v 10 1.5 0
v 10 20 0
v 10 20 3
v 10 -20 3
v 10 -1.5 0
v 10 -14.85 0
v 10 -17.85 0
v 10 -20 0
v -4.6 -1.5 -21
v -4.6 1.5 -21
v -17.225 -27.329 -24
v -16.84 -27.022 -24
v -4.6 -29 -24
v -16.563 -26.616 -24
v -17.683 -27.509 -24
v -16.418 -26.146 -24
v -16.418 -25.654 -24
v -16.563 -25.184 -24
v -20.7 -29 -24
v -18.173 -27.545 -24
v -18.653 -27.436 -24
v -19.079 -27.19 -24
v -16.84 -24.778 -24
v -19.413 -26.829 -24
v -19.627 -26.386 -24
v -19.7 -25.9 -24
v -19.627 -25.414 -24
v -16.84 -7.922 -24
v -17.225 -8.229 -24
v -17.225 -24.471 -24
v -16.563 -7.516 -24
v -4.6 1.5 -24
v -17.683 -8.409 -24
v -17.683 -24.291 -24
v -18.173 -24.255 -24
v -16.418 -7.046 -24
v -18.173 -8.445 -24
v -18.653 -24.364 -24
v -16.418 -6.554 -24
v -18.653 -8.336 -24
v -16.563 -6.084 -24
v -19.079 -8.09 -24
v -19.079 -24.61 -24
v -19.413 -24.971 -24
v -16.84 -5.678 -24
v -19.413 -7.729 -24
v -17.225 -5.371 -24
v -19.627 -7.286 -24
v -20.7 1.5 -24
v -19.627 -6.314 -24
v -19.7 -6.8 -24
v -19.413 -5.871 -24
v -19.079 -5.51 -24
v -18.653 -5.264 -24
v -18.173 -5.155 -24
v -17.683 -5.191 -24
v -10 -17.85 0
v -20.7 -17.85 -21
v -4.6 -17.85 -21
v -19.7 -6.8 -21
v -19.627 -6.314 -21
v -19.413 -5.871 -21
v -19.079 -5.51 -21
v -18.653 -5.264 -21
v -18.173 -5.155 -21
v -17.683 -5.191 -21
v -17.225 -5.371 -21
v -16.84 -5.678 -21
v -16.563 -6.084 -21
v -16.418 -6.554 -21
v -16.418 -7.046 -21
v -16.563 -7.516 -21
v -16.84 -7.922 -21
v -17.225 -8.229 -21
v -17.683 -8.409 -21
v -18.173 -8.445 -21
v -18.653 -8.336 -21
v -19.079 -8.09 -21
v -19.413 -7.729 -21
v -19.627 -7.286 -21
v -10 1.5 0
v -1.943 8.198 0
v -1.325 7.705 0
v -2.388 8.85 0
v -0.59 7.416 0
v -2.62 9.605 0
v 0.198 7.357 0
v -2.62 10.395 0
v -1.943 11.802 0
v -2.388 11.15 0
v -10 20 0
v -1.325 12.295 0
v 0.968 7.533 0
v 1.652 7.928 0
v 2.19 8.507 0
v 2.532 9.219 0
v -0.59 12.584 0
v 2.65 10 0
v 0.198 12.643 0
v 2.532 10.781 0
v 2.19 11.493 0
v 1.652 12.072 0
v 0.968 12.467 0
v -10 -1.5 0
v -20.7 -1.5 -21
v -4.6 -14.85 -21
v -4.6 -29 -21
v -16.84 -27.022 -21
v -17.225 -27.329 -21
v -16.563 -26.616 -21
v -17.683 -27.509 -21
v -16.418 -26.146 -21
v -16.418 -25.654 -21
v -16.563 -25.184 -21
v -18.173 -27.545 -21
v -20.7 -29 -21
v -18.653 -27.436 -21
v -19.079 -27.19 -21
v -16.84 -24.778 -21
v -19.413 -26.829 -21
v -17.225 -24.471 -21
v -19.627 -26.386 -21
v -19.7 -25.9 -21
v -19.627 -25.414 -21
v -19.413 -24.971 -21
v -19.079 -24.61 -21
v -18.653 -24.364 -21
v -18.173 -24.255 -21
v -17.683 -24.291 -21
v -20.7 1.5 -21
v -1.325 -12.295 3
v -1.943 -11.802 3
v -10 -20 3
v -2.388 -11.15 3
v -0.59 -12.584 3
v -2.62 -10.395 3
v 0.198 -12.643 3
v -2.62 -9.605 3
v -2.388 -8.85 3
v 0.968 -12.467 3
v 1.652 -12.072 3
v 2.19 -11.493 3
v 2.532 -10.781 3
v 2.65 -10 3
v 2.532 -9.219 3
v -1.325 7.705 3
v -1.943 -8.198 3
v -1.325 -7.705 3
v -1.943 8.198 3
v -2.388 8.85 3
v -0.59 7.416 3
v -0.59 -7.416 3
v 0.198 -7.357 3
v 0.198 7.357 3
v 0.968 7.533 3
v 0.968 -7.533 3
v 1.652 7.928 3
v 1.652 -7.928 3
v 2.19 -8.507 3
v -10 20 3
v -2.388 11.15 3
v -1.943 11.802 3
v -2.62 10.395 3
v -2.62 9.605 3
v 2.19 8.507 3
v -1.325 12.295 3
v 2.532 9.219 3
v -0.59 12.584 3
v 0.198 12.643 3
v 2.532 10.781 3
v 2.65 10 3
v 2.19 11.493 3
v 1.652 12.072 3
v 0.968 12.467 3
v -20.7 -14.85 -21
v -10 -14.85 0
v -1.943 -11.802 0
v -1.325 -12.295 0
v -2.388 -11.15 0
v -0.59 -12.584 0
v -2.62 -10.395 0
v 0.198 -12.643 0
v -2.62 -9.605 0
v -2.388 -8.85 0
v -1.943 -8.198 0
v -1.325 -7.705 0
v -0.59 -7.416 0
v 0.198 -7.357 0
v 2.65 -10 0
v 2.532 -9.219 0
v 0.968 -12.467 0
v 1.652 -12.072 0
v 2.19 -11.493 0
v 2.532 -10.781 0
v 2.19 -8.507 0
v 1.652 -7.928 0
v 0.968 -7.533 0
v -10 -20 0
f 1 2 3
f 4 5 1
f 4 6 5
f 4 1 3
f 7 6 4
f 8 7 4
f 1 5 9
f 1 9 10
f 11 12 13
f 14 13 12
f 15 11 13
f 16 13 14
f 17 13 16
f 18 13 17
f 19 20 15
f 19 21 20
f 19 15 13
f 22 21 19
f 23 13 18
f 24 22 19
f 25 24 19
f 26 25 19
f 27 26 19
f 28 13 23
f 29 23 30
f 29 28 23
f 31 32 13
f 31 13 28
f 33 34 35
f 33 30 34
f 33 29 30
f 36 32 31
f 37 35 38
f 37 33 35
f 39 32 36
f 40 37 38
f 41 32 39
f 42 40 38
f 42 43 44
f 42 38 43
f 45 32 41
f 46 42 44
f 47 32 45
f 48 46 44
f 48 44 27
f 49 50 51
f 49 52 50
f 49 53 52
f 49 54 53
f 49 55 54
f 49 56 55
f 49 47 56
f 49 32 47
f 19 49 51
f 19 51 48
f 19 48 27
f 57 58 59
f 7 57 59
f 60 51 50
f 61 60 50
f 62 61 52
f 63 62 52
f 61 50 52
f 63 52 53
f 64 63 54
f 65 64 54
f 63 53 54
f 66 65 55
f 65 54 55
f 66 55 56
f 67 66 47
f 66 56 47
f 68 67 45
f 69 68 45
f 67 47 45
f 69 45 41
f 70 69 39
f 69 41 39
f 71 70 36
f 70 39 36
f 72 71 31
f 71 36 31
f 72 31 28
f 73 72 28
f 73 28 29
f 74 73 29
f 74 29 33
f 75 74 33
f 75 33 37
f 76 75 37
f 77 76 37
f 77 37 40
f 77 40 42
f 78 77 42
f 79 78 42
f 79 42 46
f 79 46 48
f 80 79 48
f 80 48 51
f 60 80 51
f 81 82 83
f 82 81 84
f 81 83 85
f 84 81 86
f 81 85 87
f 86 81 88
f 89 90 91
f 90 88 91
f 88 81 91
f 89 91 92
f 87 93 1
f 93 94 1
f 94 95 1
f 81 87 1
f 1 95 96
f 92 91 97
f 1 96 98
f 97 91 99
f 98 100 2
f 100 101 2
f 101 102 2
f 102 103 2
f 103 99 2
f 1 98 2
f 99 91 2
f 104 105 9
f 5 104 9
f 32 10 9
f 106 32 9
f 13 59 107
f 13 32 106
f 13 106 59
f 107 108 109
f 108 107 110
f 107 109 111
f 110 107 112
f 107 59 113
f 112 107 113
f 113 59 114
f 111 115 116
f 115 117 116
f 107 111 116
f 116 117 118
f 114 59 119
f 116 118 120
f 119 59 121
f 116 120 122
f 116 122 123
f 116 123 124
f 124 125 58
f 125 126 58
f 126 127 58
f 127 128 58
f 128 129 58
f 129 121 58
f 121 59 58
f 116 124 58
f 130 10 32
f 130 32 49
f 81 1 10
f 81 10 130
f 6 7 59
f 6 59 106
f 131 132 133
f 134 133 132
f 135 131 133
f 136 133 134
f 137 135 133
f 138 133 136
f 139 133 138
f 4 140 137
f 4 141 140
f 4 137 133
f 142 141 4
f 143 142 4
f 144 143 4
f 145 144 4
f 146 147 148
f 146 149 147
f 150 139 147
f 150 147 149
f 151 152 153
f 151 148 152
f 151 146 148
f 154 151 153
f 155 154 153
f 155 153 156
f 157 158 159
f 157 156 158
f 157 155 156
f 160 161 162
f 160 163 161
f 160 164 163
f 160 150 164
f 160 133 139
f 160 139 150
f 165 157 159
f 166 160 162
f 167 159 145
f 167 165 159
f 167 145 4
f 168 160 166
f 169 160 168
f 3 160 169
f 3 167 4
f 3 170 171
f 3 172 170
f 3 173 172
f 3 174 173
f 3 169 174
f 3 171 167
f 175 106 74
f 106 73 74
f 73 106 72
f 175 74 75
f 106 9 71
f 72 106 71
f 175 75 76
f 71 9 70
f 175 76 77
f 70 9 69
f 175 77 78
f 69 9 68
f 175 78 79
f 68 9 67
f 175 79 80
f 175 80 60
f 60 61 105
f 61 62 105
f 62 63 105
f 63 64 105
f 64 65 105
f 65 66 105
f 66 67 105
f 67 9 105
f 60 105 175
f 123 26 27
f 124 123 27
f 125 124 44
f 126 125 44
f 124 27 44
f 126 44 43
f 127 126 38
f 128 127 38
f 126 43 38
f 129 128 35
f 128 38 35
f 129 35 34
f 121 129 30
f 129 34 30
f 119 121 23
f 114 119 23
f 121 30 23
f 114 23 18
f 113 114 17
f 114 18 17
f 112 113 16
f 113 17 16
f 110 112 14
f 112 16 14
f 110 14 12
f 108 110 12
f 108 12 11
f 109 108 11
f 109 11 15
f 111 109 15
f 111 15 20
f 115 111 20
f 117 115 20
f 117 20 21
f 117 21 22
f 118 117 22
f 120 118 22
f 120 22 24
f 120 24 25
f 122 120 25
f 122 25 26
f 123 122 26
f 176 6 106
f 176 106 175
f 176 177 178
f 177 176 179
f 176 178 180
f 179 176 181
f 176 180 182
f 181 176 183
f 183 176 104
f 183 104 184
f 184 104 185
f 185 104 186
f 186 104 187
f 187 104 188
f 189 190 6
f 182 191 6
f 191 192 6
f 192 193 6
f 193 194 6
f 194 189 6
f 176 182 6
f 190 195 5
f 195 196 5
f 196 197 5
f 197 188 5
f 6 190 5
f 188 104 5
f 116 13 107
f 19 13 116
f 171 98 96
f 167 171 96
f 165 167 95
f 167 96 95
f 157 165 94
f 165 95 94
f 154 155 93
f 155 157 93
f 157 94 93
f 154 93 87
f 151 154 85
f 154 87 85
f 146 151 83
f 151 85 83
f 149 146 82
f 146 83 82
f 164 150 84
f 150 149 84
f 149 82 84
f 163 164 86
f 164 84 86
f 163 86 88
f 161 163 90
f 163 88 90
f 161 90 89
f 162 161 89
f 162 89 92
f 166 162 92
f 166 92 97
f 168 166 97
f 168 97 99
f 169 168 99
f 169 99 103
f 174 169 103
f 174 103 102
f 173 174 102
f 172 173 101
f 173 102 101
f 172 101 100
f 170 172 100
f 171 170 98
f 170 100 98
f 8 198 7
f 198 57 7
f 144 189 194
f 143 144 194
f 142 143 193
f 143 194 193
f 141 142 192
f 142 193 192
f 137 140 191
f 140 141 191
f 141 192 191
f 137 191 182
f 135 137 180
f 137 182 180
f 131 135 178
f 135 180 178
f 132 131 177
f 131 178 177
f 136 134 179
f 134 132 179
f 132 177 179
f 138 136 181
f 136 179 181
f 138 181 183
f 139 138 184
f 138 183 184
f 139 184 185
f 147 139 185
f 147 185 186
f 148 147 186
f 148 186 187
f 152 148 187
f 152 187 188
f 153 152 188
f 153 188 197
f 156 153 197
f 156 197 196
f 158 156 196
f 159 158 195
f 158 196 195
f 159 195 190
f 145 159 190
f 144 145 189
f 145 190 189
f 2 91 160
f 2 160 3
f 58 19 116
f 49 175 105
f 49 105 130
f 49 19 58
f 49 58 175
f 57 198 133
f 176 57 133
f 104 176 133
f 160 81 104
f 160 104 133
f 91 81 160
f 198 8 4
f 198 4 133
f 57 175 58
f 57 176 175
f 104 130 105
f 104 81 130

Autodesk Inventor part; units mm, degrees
ref_plane "YZ Plane" through (0, 0, 0) normal (1, 0, 0) x (0, 1, 0)
ref_plane "XZ Plane" through (0, 0, 0) normal (0, 1, 0) x (-1, 0, 0)
ref_plane "XY Plane" through (0, 0, 0) normal (0, 0, 1) x (1, 0, 0)
sketch "Sketch1" plane through (0, 0, 0) normal (0, 0, 1) x (1, 0, 0)
  line L0 (10, -20) -> (-10, -20)
  line L1 (-10, -20) -> (-10, 20)
  line L2 (-10, 20) -> (10, 20)
  line L3 (10, 20) -> (10, -20)
  line L4 (10, -20) -> (-10, 20) construction
  line L5 (-10, -20) -> (10, 20) construction
  line L6 (0, -10) -> (0, 10) construction
  circle A0 centre (0, 10) radius 2.65
  circle A1 centre (0, -10) radius 2.65
  point P0 (0, 0)
  dimension "d0" = 40
  dimension "d1" = 20
  dimension "d2" = 20
  dimension "d3" = 5.3
extrude "Extrusion1" add sketch "Sketch1" along normal blind 3
ref_plane "Work Plane2" through (0, 0, -24) normal (0, 0, -1) x (-1, 0, 0)
sketch "Sketch2" plane through (0, 0, -24) normal (0, 0, -1) x (-1, 0, 0)
  circle A0 centre (18.05, -6.8) radius 1.65
  line L0 (18.05, -25.9) -> (18.05, -6.8) construction
  line L1 (4.6, -29) -> (20.7, -29)
  line L2 (4.6, 11.5) -> (4.6, -29)
  line L3 (20.7, 11.5) -> (4.6, 11.5)
  line L4 (20.7, -29) -> (20.7, 11.5)
  circle A1 centre (18.05, -25.9) radius 1.65
  line L5 (10, 20) -> (10, -20) projected
  line L6 (-10, 20) -> (10, 20) projected
  point P0 (0, 0)
  dimension "d8" = 40.5
  dimension "d9" = 16.1
  dimension "d10" = 19.1
  dimension "d11" = 3.3
  dimension "d12" = 3.3
  dimension "d13" = 2.65
  dimension "d14" = 3.1
  dimension "d15" = 8.05
  dimension "d19" = 26.8
extrude "Extrusion2" add sketch "Sketch2" against normal blind 3
sketch "Sketch4" plane through (0, 0, -21) normal (0, 0, 1) x (1, 0, 0)
  line L0 (-20.7, -14.85) -> (-4.6, -14.85)
  line L1 (-4.6, -14.85) -> (-4.6, -17.85)
  line L2 (-4.6, -17.85) -> (-20.7, -17.85)
  line L3 (-20.7, -17.85) -> (-20.7, -14.85)
  line L4 (-4.6, 1.5) -> (-20.7, 1.5)
  line L5 (-20.7, 1.5) -> (-20.7, -1.5)
  line L6 (-20.7, -1.5) -> (-4.6, -1.5)
  line L7 (-4.6, -1.5) -> (-4.6, 1.5)
  line L8 (-20.7, -16.35) -> (-4.6, -16.35) construction
  circle A0 centre (-18.05, -6.8) radius 1.65 projected
  circle A1 centre (-18.05, -25.9) radius 1.65 projected
  line L9 (-18.05, -6.8) -> (-18.05, -25.9) construction
  line L10 (-4.6, -29) -> (-4.6, 11.5) projected
  line L11 (-20.7, 11.5) -> (-20.7, -29) projected
  line L12 (-20.7, 0) -> (-4.6, 0) construction
  line L13 (-10, 20) -> (-10, -20) projected
  point P0 (0, 0)
  point P1 (-18.05, -16.35)
  point P2 (-10, 0)
  dimension "d20" = 3
sketch "Sketch5" plane through (0, 0, 0) normal (0, 0, -1) x (-1, 0, 0)
  line L0 (4.6, 1.5) -> (20.7, 1.5) projected
  line L1 (20.7, -1.5) -> (4.6, -1.5) projected
  line L2 (4.6, -17.85) -> (20.7, -17.85) projected
  line L3 (20.7, -14.85) -> (4.6, -14.85) projected
  line L4 (-10, 1.5) -> (10, 1.5)
  line L5 (10, 1.5) -> (10, -1.5)
  line L6 (10, -1.5) -> (-10, -1.5)
  line L7 (-10, -1.5) -> (-10, 1.5)
  line L8 (-10, -14.85) -> (10, -14.85)
  line L9 (10, -14.85) -> (10, -17.85)
  line L10 (10, -17.85) -> (-10, -17.85)
  line L11 (-10, -17.85) -> (-10, -14.85)
  line L12 (-10, -20) -> (-10, 20) projected
  line L13 (10, 20) -> (10, -20) projected
  point P0 (0, 0)
loft "Loft1" add profiles "Sketch4", "Sketch5" contours L5 L4 L13 L6 | L13 L4 L7 L6 / L0 L5 L1 L6 L7 L4
loft "Loft2" add profiles "Sketch4", "Sketch5" contours L0 L13 L2 L3 | L0 L1 L2 L13 / L9 L2 L10 L11 L8 L3
sketch "Sketch6" plane through (0, 0, -21) normal (0, 0, 1) x (1, 0, 0)
  line L0 (-20.7, 1.5) -> (-4.6, 1.5) projected
  line L1 (-4.6, 1.5) -> (-4.6, 11.5) projected
  line L2 (-4.6, 11.5) -> (-20.7, 11.5) projected
  line L3 (-20.7, 11.5) -> (-20.7, 1.5) projected
  point P0 (0, 0)
extrude "Extrusion3" cut sketch "Sketch6" against normal through all
properties part number "Soporte X"
